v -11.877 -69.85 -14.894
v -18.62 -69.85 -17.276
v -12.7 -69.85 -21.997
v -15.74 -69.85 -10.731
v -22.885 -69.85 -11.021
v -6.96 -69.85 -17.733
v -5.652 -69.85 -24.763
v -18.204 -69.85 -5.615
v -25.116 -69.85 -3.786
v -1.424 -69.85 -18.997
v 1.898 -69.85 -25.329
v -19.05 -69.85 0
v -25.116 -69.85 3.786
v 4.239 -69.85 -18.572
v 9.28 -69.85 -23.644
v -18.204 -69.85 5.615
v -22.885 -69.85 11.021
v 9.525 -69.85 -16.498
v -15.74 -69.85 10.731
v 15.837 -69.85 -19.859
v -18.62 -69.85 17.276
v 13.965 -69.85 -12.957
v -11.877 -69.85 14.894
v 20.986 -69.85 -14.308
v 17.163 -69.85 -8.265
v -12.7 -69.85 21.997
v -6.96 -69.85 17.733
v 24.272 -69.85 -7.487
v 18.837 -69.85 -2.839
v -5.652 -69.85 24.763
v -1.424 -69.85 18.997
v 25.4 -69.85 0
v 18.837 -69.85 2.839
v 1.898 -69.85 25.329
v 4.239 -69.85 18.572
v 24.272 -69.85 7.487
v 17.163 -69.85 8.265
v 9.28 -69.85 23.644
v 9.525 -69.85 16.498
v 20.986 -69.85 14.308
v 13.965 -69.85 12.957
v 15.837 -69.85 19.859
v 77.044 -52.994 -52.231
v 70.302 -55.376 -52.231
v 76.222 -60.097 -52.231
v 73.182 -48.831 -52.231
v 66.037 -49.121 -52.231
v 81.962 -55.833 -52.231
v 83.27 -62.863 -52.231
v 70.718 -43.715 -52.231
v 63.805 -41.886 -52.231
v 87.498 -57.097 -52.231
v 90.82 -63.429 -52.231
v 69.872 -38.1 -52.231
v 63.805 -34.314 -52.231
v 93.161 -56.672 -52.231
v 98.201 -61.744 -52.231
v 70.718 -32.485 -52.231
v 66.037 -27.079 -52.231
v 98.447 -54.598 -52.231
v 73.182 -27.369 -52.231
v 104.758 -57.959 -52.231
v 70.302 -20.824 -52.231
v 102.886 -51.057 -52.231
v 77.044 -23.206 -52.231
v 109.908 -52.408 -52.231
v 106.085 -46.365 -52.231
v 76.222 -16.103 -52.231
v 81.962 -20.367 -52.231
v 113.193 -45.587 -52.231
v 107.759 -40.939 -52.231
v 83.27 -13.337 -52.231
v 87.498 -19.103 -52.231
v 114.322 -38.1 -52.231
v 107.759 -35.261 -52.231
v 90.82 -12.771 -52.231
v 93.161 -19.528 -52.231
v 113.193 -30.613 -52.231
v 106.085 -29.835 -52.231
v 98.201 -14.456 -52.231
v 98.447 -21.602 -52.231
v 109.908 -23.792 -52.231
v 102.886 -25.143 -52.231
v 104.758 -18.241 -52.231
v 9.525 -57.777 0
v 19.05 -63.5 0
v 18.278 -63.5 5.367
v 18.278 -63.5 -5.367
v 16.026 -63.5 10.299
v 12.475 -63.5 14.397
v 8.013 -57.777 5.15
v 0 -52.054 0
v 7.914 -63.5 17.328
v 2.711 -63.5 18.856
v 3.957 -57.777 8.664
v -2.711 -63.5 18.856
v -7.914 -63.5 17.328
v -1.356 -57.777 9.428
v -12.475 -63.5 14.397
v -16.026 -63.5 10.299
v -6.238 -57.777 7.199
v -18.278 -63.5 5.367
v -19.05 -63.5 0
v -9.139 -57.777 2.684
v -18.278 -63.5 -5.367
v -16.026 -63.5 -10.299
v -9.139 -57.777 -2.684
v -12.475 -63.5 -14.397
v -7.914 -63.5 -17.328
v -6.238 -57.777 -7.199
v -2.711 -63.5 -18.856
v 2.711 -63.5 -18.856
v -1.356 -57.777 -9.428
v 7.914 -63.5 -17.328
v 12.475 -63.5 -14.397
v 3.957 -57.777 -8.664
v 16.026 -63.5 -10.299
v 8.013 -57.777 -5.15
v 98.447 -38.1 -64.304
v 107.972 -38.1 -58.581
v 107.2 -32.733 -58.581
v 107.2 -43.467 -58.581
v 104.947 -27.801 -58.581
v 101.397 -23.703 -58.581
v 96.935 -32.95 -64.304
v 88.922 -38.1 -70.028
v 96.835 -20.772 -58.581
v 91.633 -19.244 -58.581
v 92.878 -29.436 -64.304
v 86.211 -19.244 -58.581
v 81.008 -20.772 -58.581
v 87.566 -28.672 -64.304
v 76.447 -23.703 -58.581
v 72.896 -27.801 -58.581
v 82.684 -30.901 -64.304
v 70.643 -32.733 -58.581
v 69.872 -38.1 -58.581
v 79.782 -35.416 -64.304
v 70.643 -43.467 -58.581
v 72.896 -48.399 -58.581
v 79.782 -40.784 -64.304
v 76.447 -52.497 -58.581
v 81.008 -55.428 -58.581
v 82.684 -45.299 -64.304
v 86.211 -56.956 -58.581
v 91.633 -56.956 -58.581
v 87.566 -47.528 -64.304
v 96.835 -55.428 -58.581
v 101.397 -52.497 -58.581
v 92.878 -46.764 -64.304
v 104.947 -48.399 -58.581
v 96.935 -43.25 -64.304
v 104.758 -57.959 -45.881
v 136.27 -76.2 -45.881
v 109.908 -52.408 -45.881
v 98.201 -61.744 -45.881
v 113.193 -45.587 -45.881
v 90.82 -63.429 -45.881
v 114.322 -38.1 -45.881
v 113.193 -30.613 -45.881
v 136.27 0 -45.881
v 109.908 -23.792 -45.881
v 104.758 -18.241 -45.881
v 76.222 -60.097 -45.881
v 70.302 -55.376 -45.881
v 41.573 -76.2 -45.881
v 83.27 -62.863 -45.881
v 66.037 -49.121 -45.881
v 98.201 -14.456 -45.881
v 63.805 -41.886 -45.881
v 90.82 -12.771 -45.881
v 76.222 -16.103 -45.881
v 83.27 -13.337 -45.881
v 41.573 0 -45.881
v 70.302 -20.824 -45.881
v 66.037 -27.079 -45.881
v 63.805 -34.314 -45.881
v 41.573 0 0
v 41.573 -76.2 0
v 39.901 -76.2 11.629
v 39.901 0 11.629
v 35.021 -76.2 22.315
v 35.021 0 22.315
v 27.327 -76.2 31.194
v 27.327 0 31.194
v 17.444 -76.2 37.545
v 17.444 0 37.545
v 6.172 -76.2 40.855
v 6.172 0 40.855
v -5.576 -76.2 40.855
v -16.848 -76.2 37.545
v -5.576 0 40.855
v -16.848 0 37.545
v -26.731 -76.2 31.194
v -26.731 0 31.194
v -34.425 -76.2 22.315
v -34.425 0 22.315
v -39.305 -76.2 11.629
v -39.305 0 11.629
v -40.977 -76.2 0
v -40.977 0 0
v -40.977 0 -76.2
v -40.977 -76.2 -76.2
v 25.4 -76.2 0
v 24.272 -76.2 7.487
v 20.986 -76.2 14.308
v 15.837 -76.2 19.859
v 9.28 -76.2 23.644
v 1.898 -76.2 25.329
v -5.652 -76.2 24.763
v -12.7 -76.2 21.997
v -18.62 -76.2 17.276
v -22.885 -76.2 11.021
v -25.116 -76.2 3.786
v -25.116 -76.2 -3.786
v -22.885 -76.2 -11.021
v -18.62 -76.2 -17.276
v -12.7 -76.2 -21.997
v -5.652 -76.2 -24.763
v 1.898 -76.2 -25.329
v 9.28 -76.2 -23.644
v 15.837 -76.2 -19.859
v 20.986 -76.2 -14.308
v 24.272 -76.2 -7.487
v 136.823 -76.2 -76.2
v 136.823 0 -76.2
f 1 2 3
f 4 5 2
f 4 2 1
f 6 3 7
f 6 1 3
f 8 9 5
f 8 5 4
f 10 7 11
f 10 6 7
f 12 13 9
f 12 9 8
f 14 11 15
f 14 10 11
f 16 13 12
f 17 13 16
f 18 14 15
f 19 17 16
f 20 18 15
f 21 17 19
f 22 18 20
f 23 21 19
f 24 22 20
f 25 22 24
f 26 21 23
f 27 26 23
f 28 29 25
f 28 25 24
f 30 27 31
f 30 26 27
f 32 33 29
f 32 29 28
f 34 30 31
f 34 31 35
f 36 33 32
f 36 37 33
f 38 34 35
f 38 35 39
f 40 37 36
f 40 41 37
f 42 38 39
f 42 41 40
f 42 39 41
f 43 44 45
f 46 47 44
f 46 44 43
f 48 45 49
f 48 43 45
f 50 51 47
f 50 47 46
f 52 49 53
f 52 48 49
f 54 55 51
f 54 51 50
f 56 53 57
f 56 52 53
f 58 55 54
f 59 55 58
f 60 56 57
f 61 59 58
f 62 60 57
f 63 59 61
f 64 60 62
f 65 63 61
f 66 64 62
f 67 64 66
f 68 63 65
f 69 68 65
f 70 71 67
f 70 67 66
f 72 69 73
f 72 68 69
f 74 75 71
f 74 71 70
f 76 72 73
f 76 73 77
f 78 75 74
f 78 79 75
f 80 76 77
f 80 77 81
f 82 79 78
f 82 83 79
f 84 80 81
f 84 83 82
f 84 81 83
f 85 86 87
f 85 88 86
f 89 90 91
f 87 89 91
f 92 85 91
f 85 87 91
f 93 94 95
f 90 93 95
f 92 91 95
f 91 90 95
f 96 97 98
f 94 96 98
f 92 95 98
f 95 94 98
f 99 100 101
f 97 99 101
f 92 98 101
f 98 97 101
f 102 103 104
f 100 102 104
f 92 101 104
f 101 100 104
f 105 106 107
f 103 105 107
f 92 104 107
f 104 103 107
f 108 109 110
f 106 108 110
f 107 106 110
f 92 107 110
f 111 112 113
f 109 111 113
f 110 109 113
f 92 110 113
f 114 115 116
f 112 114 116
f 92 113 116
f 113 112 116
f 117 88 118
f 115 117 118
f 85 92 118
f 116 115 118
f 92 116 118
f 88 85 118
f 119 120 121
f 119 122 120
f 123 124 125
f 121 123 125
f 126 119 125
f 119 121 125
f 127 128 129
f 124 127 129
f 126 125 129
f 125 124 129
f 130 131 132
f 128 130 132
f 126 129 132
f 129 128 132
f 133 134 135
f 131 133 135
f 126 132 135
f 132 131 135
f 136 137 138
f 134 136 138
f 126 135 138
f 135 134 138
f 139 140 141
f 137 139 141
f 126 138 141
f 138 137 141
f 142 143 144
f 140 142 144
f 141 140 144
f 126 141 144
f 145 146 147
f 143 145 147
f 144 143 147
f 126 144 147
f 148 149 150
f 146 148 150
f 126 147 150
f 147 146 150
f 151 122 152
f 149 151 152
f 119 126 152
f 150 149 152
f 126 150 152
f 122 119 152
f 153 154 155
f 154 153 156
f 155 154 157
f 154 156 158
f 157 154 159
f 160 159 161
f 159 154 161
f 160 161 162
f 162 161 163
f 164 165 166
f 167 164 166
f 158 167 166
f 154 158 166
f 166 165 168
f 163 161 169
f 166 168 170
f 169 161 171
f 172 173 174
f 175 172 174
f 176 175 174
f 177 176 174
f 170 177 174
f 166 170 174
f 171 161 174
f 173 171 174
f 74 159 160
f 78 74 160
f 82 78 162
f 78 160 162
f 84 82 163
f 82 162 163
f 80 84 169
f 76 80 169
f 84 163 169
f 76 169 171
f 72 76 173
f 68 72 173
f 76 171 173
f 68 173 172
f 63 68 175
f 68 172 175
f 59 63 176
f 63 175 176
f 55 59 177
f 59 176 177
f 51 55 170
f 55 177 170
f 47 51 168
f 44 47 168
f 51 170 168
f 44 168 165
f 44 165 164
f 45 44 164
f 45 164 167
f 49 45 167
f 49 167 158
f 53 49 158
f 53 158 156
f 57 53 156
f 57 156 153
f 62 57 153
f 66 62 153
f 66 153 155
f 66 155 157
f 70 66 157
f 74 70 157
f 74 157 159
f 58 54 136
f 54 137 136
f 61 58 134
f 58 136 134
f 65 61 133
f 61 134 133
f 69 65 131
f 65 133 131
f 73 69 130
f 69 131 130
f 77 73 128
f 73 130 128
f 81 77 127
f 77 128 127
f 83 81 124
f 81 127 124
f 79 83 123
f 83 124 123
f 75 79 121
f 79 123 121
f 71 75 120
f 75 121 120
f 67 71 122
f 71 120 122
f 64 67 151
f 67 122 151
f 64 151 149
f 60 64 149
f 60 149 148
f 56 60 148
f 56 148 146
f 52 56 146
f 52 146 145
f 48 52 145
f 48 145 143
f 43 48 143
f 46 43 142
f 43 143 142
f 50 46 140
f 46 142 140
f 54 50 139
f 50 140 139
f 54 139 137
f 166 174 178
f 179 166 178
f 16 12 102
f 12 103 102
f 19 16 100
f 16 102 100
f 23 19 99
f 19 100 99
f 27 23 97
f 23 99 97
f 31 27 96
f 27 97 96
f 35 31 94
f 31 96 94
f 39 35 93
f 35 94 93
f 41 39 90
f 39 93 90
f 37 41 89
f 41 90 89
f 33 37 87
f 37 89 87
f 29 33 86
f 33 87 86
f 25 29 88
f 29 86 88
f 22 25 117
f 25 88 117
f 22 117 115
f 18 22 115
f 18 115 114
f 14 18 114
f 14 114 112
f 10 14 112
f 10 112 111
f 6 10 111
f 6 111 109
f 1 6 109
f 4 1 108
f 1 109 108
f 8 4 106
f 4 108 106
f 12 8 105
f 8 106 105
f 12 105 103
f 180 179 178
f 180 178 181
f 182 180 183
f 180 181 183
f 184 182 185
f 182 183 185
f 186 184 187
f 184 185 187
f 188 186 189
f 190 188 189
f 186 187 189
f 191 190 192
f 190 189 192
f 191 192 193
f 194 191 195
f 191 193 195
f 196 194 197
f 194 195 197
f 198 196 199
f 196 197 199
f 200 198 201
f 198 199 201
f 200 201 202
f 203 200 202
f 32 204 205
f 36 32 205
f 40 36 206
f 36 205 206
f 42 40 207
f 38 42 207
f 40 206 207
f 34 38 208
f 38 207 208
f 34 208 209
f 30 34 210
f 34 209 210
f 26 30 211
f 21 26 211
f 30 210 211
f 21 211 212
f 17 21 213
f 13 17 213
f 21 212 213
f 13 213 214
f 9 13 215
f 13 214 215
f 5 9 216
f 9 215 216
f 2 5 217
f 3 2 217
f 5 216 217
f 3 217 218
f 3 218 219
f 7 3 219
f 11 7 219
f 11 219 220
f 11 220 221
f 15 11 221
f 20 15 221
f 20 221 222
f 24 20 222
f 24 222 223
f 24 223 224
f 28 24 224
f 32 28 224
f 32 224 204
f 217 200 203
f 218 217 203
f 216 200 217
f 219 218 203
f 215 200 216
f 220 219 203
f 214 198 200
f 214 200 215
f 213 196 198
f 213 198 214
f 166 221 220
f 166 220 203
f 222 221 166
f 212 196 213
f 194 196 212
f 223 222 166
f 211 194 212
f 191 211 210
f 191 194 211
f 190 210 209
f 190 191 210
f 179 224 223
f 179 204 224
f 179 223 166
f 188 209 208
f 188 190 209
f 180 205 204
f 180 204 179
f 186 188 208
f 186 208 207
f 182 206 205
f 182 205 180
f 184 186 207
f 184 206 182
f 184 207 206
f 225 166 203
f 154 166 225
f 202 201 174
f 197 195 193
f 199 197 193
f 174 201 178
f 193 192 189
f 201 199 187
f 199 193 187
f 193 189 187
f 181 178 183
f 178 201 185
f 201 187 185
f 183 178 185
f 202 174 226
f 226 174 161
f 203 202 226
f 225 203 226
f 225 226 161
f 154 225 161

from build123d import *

# Parameters (mm, degrees)
F0_R           = 19.05
F1_DEPTH       = 76.2
F3_D           = 38.1
F3_DEPTH       = 12.7
F3_CBORE_D     = 50.8
F3_CBORE_DEPTH = 6.35
F3_TIP         = 11.4463947925
F5_D           = 38.1
F5_DEPTH       = 12.7
F5_CBORE_D     = 50.8
F5_CBORE_DEPTH = 6.35
F5_TIP         = 11.4463947925


with BuildPart() as f1:
    # F0 (on Front) → F1 (new body)
    with BuildSketch(Plane.XZ):
        with BuildLine():
            ThreePointArc((-40.9769218572, 0), (0.2980781428, -41.275), (41.5730781428, 0))
            ThreePointArc((41.5730781428, 0), (0.2980781428, 41.275), (-40.9769218572, 0))
        make_face()
        with Locations((0.2980781428, 0)):
            Circle(F0_R, mode=Mode.SUBTRACT)
        with BuildLine():
            Line((41.5730781428, -45.8812290595), (41.5730781428, 0))
            ThreePointArc((41.5730781428, 0), (0.2980781428, -41.275), (-40.9769218572, 0))
            Line((-40.9769218572, 0), (-40.9769218572, -76.2))
            Line((-40.9769218572, -76.2), (136.8230781428, -76.2))
            Line((136.8230781428, -76.2), (136.2701599936, -45.8812290595))
            Line((136.2701599936, -45.8812290595), (41.5730781428, -45.8812290595))
        make_face()
        with Locations((0.2980781428, 0)):
            Circle(F0_R)
    extrude(amount=F1_DEPTH)

    # F3
    with Locations(Plane.XZ.offset(76.2)):
        with Locations((0, 0)):
            CounterBoreHole(F3_D / 2, F3_CBORE_D / 2, F3_CBORE_DEPTH, depth=F3_DEPTH)
            with Locations((0, 0, -(F3_DEPTH + F3_TIP / 2))):  # 118° drill point
                Cone(0, F3_D / 2, F3_TIP, mode=Mode.SUBTRACT)

    # F5
    with Locations(Plane.XY.offset(-45.8812290595)):
        with Locations((88.9216190682, -38.1)):
            CounterBoreHole(F5_D / 2, F5_CBORE_D / 2, F5_CBORE_DEPTH, depth=F5_DEPTH)
            with Locations((0, 0, -(F5_DEPTH + F5_TIP / 2))):  # 118° drill point
                Cone(0, F5_D / 2, F5_TIP, mode=Mode.SUBTRACT)


solid = f1.part
